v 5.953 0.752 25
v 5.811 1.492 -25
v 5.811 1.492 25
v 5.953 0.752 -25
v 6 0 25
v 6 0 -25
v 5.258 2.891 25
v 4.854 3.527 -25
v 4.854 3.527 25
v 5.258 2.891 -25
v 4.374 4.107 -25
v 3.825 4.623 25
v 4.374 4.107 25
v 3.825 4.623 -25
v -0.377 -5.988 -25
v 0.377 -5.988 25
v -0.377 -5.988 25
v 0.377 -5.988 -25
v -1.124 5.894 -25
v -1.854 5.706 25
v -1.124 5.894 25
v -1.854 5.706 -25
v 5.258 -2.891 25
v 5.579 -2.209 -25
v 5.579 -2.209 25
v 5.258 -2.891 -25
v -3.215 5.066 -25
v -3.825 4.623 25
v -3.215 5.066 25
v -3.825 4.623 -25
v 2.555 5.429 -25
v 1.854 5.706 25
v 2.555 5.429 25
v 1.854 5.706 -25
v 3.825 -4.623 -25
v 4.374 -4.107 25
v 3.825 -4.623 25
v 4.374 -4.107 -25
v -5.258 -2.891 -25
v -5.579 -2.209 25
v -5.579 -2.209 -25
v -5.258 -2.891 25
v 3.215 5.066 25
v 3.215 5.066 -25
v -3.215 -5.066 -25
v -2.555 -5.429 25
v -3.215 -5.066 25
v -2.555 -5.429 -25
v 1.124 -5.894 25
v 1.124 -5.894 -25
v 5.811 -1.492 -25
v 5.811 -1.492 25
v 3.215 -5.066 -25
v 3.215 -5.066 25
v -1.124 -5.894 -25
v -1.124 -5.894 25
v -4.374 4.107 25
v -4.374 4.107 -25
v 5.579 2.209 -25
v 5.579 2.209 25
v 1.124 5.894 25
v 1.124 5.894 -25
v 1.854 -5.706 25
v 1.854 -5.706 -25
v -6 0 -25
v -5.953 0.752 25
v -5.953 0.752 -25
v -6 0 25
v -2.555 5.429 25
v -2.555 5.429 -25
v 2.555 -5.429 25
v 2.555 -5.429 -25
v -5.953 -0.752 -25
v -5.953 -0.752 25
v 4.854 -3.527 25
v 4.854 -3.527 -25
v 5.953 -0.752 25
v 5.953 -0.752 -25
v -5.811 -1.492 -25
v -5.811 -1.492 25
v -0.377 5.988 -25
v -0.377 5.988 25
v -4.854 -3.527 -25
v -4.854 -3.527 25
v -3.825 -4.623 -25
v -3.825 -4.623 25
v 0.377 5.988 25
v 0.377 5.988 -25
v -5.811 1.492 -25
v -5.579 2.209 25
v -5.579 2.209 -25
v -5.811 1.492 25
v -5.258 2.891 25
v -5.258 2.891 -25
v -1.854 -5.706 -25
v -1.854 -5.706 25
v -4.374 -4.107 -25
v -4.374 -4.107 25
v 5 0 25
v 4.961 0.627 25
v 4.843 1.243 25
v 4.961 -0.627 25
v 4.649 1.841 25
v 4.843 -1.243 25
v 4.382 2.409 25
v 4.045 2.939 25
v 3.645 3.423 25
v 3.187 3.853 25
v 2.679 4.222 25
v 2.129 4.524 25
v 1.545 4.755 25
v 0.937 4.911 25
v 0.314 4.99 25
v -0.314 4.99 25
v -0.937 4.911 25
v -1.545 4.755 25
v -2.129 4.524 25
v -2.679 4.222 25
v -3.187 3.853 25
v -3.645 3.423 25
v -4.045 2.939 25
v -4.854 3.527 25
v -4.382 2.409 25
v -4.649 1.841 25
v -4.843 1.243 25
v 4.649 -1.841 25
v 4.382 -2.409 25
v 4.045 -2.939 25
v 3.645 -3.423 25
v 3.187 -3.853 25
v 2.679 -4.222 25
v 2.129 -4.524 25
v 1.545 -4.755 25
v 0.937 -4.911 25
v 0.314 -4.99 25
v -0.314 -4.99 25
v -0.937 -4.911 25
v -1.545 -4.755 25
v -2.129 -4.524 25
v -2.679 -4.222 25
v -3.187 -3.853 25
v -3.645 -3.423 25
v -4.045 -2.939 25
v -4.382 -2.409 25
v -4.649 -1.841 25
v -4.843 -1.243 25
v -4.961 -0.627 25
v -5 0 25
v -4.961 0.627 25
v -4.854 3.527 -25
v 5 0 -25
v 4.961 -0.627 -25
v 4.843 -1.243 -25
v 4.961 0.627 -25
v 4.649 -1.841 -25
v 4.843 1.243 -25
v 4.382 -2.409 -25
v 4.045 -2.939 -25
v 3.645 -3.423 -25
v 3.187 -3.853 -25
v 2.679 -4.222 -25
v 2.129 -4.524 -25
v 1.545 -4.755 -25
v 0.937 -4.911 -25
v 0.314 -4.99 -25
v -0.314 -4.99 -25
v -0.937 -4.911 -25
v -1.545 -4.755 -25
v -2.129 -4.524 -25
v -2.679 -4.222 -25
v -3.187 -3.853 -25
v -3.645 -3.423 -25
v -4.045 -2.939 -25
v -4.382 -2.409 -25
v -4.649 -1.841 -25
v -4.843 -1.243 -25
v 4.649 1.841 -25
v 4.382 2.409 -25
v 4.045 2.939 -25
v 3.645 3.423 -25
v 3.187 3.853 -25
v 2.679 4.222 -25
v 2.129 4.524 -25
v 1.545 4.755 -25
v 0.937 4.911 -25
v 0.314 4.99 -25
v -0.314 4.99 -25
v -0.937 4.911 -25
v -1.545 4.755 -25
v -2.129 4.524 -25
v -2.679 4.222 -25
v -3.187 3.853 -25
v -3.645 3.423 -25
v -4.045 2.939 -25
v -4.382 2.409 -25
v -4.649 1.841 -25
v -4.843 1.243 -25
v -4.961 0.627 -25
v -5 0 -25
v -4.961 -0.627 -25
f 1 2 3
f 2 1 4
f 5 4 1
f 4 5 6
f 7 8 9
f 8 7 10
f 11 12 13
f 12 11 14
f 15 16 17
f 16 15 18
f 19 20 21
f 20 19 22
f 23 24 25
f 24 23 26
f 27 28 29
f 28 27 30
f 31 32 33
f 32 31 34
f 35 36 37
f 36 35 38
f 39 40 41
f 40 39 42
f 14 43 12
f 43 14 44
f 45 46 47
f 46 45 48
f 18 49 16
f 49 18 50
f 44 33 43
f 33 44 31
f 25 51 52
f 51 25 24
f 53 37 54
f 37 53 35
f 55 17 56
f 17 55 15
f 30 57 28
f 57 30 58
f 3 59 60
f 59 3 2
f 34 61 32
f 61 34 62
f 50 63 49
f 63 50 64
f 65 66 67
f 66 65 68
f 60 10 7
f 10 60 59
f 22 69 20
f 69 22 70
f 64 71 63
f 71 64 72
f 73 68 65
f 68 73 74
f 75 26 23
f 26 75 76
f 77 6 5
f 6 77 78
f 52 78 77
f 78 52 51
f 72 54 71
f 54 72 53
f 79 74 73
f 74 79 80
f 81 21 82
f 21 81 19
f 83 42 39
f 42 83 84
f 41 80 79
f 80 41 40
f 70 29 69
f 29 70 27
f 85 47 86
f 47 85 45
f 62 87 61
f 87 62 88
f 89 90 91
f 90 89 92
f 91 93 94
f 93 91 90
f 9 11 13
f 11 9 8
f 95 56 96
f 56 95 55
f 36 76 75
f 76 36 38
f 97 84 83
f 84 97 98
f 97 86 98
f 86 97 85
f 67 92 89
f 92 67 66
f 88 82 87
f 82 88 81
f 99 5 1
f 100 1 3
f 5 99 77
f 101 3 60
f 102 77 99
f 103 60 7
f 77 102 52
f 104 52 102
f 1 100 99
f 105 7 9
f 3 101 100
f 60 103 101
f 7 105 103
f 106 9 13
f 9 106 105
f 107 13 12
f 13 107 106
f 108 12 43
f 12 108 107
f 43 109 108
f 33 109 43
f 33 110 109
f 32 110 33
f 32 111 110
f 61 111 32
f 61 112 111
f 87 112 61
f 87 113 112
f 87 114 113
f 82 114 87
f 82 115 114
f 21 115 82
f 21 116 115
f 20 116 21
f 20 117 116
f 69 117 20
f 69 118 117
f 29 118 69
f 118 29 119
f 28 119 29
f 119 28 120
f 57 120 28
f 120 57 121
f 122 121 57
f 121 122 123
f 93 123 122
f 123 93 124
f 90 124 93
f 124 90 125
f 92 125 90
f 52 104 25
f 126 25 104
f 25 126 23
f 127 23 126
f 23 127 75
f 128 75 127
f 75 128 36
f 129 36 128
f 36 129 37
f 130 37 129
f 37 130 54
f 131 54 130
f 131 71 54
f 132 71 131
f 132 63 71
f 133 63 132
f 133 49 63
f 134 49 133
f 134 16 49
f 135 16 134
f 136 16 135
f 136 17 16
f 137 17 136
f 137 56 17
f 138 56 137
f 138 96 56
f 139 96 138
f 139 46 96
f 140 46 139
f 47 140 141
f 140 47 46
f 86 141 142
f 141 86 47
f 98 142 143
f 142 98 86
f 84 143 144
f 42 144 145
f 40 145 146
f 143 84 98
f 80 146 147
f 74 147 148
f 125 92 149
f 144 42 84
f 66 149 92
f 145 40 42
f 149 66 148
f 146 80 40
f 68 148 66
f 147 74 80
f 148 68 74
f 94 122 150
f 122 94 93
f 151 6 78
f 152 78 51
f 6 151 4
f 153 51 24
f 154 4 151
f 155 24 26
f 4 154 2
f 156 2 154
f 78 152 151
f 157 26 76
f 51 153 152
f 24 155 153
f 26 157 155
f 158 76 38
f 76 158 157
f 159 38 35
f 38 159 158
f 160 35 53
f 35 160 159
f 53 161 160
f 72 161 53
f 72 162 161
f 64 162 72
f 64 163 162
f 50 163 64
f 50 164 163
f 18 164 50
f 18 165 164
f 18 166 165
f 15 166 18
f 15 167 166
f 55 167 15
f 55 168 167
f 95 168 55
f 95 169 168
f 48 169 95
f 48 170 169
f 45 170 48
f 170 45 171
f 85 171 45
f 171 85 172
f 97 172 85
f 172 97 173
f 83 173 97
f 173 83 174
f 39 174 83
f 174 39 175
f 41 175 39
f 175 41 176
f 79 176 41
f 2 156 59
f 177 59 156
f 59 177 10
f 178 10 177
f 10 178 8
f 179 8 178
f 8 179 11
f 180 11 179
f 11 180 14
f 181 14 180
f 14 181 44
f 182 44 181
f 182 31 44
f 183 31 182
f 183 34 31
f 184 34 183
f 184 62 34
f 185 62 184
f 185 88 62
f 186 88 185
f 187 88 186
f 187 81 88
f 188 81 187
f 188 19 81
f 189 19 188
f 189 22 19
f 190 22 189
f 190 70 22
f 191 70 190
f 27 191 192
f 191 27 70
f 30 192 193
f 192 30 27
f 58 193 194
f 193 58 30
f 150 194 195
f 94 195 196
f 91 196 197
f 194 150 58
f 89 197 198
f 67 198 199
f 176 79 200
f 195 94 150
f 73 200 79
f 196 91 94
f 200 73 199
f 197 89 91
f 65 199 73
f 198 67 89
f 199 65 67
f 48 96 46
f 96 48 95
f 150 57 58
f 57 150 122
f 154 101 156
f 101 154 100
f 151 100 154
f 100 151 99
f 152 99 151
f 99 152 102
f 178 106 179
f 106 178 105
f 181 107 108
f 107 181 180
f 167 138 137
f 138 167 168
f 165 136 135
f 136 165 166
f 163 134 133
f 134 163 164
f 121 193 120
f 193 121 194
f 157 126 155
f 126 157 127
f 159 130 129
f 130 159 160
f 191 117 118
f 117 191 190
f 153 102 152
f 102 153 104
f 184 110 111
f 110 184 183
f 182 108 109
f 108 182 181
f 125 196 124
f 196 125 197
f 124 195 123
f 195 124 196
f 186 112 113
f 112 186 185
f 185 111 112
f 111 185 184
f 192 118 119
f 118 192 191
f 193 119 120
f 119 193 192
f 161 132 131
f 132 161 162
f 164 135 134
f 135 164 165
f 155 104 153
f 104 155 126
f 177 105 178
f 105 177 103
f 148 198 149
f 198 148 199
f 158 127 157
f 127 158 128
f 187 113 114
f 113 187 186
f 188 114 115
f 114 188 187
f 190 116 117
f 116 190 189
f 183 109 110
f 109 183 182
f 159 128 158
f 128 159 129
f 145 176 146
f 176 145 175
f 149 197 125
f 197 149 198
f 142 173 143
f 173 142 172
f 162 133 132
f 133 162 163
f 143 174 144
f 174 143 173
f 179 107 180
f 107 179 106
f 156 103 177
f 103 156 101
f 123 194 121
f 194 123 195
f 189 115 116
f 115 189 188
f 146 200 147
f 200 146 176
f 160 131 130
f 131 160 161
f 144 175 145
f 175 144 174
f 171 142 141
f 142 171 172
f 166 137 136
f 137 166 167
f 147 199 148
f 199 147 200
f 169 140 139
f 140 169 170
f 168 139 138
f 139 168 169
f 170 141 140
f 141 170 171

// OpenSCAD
$fn = 50;


difference() {
	union() {
		translate(v = [0, 0, -25.0000000000]) {
			cylinder(h = 50, r = 6.0000000000);
		}
	}
	union() {
		translate(v = [0, 0, -100.0000000000]) {
			cylinder(h = 200, r = 5.0000000000);
		}
	}
}
